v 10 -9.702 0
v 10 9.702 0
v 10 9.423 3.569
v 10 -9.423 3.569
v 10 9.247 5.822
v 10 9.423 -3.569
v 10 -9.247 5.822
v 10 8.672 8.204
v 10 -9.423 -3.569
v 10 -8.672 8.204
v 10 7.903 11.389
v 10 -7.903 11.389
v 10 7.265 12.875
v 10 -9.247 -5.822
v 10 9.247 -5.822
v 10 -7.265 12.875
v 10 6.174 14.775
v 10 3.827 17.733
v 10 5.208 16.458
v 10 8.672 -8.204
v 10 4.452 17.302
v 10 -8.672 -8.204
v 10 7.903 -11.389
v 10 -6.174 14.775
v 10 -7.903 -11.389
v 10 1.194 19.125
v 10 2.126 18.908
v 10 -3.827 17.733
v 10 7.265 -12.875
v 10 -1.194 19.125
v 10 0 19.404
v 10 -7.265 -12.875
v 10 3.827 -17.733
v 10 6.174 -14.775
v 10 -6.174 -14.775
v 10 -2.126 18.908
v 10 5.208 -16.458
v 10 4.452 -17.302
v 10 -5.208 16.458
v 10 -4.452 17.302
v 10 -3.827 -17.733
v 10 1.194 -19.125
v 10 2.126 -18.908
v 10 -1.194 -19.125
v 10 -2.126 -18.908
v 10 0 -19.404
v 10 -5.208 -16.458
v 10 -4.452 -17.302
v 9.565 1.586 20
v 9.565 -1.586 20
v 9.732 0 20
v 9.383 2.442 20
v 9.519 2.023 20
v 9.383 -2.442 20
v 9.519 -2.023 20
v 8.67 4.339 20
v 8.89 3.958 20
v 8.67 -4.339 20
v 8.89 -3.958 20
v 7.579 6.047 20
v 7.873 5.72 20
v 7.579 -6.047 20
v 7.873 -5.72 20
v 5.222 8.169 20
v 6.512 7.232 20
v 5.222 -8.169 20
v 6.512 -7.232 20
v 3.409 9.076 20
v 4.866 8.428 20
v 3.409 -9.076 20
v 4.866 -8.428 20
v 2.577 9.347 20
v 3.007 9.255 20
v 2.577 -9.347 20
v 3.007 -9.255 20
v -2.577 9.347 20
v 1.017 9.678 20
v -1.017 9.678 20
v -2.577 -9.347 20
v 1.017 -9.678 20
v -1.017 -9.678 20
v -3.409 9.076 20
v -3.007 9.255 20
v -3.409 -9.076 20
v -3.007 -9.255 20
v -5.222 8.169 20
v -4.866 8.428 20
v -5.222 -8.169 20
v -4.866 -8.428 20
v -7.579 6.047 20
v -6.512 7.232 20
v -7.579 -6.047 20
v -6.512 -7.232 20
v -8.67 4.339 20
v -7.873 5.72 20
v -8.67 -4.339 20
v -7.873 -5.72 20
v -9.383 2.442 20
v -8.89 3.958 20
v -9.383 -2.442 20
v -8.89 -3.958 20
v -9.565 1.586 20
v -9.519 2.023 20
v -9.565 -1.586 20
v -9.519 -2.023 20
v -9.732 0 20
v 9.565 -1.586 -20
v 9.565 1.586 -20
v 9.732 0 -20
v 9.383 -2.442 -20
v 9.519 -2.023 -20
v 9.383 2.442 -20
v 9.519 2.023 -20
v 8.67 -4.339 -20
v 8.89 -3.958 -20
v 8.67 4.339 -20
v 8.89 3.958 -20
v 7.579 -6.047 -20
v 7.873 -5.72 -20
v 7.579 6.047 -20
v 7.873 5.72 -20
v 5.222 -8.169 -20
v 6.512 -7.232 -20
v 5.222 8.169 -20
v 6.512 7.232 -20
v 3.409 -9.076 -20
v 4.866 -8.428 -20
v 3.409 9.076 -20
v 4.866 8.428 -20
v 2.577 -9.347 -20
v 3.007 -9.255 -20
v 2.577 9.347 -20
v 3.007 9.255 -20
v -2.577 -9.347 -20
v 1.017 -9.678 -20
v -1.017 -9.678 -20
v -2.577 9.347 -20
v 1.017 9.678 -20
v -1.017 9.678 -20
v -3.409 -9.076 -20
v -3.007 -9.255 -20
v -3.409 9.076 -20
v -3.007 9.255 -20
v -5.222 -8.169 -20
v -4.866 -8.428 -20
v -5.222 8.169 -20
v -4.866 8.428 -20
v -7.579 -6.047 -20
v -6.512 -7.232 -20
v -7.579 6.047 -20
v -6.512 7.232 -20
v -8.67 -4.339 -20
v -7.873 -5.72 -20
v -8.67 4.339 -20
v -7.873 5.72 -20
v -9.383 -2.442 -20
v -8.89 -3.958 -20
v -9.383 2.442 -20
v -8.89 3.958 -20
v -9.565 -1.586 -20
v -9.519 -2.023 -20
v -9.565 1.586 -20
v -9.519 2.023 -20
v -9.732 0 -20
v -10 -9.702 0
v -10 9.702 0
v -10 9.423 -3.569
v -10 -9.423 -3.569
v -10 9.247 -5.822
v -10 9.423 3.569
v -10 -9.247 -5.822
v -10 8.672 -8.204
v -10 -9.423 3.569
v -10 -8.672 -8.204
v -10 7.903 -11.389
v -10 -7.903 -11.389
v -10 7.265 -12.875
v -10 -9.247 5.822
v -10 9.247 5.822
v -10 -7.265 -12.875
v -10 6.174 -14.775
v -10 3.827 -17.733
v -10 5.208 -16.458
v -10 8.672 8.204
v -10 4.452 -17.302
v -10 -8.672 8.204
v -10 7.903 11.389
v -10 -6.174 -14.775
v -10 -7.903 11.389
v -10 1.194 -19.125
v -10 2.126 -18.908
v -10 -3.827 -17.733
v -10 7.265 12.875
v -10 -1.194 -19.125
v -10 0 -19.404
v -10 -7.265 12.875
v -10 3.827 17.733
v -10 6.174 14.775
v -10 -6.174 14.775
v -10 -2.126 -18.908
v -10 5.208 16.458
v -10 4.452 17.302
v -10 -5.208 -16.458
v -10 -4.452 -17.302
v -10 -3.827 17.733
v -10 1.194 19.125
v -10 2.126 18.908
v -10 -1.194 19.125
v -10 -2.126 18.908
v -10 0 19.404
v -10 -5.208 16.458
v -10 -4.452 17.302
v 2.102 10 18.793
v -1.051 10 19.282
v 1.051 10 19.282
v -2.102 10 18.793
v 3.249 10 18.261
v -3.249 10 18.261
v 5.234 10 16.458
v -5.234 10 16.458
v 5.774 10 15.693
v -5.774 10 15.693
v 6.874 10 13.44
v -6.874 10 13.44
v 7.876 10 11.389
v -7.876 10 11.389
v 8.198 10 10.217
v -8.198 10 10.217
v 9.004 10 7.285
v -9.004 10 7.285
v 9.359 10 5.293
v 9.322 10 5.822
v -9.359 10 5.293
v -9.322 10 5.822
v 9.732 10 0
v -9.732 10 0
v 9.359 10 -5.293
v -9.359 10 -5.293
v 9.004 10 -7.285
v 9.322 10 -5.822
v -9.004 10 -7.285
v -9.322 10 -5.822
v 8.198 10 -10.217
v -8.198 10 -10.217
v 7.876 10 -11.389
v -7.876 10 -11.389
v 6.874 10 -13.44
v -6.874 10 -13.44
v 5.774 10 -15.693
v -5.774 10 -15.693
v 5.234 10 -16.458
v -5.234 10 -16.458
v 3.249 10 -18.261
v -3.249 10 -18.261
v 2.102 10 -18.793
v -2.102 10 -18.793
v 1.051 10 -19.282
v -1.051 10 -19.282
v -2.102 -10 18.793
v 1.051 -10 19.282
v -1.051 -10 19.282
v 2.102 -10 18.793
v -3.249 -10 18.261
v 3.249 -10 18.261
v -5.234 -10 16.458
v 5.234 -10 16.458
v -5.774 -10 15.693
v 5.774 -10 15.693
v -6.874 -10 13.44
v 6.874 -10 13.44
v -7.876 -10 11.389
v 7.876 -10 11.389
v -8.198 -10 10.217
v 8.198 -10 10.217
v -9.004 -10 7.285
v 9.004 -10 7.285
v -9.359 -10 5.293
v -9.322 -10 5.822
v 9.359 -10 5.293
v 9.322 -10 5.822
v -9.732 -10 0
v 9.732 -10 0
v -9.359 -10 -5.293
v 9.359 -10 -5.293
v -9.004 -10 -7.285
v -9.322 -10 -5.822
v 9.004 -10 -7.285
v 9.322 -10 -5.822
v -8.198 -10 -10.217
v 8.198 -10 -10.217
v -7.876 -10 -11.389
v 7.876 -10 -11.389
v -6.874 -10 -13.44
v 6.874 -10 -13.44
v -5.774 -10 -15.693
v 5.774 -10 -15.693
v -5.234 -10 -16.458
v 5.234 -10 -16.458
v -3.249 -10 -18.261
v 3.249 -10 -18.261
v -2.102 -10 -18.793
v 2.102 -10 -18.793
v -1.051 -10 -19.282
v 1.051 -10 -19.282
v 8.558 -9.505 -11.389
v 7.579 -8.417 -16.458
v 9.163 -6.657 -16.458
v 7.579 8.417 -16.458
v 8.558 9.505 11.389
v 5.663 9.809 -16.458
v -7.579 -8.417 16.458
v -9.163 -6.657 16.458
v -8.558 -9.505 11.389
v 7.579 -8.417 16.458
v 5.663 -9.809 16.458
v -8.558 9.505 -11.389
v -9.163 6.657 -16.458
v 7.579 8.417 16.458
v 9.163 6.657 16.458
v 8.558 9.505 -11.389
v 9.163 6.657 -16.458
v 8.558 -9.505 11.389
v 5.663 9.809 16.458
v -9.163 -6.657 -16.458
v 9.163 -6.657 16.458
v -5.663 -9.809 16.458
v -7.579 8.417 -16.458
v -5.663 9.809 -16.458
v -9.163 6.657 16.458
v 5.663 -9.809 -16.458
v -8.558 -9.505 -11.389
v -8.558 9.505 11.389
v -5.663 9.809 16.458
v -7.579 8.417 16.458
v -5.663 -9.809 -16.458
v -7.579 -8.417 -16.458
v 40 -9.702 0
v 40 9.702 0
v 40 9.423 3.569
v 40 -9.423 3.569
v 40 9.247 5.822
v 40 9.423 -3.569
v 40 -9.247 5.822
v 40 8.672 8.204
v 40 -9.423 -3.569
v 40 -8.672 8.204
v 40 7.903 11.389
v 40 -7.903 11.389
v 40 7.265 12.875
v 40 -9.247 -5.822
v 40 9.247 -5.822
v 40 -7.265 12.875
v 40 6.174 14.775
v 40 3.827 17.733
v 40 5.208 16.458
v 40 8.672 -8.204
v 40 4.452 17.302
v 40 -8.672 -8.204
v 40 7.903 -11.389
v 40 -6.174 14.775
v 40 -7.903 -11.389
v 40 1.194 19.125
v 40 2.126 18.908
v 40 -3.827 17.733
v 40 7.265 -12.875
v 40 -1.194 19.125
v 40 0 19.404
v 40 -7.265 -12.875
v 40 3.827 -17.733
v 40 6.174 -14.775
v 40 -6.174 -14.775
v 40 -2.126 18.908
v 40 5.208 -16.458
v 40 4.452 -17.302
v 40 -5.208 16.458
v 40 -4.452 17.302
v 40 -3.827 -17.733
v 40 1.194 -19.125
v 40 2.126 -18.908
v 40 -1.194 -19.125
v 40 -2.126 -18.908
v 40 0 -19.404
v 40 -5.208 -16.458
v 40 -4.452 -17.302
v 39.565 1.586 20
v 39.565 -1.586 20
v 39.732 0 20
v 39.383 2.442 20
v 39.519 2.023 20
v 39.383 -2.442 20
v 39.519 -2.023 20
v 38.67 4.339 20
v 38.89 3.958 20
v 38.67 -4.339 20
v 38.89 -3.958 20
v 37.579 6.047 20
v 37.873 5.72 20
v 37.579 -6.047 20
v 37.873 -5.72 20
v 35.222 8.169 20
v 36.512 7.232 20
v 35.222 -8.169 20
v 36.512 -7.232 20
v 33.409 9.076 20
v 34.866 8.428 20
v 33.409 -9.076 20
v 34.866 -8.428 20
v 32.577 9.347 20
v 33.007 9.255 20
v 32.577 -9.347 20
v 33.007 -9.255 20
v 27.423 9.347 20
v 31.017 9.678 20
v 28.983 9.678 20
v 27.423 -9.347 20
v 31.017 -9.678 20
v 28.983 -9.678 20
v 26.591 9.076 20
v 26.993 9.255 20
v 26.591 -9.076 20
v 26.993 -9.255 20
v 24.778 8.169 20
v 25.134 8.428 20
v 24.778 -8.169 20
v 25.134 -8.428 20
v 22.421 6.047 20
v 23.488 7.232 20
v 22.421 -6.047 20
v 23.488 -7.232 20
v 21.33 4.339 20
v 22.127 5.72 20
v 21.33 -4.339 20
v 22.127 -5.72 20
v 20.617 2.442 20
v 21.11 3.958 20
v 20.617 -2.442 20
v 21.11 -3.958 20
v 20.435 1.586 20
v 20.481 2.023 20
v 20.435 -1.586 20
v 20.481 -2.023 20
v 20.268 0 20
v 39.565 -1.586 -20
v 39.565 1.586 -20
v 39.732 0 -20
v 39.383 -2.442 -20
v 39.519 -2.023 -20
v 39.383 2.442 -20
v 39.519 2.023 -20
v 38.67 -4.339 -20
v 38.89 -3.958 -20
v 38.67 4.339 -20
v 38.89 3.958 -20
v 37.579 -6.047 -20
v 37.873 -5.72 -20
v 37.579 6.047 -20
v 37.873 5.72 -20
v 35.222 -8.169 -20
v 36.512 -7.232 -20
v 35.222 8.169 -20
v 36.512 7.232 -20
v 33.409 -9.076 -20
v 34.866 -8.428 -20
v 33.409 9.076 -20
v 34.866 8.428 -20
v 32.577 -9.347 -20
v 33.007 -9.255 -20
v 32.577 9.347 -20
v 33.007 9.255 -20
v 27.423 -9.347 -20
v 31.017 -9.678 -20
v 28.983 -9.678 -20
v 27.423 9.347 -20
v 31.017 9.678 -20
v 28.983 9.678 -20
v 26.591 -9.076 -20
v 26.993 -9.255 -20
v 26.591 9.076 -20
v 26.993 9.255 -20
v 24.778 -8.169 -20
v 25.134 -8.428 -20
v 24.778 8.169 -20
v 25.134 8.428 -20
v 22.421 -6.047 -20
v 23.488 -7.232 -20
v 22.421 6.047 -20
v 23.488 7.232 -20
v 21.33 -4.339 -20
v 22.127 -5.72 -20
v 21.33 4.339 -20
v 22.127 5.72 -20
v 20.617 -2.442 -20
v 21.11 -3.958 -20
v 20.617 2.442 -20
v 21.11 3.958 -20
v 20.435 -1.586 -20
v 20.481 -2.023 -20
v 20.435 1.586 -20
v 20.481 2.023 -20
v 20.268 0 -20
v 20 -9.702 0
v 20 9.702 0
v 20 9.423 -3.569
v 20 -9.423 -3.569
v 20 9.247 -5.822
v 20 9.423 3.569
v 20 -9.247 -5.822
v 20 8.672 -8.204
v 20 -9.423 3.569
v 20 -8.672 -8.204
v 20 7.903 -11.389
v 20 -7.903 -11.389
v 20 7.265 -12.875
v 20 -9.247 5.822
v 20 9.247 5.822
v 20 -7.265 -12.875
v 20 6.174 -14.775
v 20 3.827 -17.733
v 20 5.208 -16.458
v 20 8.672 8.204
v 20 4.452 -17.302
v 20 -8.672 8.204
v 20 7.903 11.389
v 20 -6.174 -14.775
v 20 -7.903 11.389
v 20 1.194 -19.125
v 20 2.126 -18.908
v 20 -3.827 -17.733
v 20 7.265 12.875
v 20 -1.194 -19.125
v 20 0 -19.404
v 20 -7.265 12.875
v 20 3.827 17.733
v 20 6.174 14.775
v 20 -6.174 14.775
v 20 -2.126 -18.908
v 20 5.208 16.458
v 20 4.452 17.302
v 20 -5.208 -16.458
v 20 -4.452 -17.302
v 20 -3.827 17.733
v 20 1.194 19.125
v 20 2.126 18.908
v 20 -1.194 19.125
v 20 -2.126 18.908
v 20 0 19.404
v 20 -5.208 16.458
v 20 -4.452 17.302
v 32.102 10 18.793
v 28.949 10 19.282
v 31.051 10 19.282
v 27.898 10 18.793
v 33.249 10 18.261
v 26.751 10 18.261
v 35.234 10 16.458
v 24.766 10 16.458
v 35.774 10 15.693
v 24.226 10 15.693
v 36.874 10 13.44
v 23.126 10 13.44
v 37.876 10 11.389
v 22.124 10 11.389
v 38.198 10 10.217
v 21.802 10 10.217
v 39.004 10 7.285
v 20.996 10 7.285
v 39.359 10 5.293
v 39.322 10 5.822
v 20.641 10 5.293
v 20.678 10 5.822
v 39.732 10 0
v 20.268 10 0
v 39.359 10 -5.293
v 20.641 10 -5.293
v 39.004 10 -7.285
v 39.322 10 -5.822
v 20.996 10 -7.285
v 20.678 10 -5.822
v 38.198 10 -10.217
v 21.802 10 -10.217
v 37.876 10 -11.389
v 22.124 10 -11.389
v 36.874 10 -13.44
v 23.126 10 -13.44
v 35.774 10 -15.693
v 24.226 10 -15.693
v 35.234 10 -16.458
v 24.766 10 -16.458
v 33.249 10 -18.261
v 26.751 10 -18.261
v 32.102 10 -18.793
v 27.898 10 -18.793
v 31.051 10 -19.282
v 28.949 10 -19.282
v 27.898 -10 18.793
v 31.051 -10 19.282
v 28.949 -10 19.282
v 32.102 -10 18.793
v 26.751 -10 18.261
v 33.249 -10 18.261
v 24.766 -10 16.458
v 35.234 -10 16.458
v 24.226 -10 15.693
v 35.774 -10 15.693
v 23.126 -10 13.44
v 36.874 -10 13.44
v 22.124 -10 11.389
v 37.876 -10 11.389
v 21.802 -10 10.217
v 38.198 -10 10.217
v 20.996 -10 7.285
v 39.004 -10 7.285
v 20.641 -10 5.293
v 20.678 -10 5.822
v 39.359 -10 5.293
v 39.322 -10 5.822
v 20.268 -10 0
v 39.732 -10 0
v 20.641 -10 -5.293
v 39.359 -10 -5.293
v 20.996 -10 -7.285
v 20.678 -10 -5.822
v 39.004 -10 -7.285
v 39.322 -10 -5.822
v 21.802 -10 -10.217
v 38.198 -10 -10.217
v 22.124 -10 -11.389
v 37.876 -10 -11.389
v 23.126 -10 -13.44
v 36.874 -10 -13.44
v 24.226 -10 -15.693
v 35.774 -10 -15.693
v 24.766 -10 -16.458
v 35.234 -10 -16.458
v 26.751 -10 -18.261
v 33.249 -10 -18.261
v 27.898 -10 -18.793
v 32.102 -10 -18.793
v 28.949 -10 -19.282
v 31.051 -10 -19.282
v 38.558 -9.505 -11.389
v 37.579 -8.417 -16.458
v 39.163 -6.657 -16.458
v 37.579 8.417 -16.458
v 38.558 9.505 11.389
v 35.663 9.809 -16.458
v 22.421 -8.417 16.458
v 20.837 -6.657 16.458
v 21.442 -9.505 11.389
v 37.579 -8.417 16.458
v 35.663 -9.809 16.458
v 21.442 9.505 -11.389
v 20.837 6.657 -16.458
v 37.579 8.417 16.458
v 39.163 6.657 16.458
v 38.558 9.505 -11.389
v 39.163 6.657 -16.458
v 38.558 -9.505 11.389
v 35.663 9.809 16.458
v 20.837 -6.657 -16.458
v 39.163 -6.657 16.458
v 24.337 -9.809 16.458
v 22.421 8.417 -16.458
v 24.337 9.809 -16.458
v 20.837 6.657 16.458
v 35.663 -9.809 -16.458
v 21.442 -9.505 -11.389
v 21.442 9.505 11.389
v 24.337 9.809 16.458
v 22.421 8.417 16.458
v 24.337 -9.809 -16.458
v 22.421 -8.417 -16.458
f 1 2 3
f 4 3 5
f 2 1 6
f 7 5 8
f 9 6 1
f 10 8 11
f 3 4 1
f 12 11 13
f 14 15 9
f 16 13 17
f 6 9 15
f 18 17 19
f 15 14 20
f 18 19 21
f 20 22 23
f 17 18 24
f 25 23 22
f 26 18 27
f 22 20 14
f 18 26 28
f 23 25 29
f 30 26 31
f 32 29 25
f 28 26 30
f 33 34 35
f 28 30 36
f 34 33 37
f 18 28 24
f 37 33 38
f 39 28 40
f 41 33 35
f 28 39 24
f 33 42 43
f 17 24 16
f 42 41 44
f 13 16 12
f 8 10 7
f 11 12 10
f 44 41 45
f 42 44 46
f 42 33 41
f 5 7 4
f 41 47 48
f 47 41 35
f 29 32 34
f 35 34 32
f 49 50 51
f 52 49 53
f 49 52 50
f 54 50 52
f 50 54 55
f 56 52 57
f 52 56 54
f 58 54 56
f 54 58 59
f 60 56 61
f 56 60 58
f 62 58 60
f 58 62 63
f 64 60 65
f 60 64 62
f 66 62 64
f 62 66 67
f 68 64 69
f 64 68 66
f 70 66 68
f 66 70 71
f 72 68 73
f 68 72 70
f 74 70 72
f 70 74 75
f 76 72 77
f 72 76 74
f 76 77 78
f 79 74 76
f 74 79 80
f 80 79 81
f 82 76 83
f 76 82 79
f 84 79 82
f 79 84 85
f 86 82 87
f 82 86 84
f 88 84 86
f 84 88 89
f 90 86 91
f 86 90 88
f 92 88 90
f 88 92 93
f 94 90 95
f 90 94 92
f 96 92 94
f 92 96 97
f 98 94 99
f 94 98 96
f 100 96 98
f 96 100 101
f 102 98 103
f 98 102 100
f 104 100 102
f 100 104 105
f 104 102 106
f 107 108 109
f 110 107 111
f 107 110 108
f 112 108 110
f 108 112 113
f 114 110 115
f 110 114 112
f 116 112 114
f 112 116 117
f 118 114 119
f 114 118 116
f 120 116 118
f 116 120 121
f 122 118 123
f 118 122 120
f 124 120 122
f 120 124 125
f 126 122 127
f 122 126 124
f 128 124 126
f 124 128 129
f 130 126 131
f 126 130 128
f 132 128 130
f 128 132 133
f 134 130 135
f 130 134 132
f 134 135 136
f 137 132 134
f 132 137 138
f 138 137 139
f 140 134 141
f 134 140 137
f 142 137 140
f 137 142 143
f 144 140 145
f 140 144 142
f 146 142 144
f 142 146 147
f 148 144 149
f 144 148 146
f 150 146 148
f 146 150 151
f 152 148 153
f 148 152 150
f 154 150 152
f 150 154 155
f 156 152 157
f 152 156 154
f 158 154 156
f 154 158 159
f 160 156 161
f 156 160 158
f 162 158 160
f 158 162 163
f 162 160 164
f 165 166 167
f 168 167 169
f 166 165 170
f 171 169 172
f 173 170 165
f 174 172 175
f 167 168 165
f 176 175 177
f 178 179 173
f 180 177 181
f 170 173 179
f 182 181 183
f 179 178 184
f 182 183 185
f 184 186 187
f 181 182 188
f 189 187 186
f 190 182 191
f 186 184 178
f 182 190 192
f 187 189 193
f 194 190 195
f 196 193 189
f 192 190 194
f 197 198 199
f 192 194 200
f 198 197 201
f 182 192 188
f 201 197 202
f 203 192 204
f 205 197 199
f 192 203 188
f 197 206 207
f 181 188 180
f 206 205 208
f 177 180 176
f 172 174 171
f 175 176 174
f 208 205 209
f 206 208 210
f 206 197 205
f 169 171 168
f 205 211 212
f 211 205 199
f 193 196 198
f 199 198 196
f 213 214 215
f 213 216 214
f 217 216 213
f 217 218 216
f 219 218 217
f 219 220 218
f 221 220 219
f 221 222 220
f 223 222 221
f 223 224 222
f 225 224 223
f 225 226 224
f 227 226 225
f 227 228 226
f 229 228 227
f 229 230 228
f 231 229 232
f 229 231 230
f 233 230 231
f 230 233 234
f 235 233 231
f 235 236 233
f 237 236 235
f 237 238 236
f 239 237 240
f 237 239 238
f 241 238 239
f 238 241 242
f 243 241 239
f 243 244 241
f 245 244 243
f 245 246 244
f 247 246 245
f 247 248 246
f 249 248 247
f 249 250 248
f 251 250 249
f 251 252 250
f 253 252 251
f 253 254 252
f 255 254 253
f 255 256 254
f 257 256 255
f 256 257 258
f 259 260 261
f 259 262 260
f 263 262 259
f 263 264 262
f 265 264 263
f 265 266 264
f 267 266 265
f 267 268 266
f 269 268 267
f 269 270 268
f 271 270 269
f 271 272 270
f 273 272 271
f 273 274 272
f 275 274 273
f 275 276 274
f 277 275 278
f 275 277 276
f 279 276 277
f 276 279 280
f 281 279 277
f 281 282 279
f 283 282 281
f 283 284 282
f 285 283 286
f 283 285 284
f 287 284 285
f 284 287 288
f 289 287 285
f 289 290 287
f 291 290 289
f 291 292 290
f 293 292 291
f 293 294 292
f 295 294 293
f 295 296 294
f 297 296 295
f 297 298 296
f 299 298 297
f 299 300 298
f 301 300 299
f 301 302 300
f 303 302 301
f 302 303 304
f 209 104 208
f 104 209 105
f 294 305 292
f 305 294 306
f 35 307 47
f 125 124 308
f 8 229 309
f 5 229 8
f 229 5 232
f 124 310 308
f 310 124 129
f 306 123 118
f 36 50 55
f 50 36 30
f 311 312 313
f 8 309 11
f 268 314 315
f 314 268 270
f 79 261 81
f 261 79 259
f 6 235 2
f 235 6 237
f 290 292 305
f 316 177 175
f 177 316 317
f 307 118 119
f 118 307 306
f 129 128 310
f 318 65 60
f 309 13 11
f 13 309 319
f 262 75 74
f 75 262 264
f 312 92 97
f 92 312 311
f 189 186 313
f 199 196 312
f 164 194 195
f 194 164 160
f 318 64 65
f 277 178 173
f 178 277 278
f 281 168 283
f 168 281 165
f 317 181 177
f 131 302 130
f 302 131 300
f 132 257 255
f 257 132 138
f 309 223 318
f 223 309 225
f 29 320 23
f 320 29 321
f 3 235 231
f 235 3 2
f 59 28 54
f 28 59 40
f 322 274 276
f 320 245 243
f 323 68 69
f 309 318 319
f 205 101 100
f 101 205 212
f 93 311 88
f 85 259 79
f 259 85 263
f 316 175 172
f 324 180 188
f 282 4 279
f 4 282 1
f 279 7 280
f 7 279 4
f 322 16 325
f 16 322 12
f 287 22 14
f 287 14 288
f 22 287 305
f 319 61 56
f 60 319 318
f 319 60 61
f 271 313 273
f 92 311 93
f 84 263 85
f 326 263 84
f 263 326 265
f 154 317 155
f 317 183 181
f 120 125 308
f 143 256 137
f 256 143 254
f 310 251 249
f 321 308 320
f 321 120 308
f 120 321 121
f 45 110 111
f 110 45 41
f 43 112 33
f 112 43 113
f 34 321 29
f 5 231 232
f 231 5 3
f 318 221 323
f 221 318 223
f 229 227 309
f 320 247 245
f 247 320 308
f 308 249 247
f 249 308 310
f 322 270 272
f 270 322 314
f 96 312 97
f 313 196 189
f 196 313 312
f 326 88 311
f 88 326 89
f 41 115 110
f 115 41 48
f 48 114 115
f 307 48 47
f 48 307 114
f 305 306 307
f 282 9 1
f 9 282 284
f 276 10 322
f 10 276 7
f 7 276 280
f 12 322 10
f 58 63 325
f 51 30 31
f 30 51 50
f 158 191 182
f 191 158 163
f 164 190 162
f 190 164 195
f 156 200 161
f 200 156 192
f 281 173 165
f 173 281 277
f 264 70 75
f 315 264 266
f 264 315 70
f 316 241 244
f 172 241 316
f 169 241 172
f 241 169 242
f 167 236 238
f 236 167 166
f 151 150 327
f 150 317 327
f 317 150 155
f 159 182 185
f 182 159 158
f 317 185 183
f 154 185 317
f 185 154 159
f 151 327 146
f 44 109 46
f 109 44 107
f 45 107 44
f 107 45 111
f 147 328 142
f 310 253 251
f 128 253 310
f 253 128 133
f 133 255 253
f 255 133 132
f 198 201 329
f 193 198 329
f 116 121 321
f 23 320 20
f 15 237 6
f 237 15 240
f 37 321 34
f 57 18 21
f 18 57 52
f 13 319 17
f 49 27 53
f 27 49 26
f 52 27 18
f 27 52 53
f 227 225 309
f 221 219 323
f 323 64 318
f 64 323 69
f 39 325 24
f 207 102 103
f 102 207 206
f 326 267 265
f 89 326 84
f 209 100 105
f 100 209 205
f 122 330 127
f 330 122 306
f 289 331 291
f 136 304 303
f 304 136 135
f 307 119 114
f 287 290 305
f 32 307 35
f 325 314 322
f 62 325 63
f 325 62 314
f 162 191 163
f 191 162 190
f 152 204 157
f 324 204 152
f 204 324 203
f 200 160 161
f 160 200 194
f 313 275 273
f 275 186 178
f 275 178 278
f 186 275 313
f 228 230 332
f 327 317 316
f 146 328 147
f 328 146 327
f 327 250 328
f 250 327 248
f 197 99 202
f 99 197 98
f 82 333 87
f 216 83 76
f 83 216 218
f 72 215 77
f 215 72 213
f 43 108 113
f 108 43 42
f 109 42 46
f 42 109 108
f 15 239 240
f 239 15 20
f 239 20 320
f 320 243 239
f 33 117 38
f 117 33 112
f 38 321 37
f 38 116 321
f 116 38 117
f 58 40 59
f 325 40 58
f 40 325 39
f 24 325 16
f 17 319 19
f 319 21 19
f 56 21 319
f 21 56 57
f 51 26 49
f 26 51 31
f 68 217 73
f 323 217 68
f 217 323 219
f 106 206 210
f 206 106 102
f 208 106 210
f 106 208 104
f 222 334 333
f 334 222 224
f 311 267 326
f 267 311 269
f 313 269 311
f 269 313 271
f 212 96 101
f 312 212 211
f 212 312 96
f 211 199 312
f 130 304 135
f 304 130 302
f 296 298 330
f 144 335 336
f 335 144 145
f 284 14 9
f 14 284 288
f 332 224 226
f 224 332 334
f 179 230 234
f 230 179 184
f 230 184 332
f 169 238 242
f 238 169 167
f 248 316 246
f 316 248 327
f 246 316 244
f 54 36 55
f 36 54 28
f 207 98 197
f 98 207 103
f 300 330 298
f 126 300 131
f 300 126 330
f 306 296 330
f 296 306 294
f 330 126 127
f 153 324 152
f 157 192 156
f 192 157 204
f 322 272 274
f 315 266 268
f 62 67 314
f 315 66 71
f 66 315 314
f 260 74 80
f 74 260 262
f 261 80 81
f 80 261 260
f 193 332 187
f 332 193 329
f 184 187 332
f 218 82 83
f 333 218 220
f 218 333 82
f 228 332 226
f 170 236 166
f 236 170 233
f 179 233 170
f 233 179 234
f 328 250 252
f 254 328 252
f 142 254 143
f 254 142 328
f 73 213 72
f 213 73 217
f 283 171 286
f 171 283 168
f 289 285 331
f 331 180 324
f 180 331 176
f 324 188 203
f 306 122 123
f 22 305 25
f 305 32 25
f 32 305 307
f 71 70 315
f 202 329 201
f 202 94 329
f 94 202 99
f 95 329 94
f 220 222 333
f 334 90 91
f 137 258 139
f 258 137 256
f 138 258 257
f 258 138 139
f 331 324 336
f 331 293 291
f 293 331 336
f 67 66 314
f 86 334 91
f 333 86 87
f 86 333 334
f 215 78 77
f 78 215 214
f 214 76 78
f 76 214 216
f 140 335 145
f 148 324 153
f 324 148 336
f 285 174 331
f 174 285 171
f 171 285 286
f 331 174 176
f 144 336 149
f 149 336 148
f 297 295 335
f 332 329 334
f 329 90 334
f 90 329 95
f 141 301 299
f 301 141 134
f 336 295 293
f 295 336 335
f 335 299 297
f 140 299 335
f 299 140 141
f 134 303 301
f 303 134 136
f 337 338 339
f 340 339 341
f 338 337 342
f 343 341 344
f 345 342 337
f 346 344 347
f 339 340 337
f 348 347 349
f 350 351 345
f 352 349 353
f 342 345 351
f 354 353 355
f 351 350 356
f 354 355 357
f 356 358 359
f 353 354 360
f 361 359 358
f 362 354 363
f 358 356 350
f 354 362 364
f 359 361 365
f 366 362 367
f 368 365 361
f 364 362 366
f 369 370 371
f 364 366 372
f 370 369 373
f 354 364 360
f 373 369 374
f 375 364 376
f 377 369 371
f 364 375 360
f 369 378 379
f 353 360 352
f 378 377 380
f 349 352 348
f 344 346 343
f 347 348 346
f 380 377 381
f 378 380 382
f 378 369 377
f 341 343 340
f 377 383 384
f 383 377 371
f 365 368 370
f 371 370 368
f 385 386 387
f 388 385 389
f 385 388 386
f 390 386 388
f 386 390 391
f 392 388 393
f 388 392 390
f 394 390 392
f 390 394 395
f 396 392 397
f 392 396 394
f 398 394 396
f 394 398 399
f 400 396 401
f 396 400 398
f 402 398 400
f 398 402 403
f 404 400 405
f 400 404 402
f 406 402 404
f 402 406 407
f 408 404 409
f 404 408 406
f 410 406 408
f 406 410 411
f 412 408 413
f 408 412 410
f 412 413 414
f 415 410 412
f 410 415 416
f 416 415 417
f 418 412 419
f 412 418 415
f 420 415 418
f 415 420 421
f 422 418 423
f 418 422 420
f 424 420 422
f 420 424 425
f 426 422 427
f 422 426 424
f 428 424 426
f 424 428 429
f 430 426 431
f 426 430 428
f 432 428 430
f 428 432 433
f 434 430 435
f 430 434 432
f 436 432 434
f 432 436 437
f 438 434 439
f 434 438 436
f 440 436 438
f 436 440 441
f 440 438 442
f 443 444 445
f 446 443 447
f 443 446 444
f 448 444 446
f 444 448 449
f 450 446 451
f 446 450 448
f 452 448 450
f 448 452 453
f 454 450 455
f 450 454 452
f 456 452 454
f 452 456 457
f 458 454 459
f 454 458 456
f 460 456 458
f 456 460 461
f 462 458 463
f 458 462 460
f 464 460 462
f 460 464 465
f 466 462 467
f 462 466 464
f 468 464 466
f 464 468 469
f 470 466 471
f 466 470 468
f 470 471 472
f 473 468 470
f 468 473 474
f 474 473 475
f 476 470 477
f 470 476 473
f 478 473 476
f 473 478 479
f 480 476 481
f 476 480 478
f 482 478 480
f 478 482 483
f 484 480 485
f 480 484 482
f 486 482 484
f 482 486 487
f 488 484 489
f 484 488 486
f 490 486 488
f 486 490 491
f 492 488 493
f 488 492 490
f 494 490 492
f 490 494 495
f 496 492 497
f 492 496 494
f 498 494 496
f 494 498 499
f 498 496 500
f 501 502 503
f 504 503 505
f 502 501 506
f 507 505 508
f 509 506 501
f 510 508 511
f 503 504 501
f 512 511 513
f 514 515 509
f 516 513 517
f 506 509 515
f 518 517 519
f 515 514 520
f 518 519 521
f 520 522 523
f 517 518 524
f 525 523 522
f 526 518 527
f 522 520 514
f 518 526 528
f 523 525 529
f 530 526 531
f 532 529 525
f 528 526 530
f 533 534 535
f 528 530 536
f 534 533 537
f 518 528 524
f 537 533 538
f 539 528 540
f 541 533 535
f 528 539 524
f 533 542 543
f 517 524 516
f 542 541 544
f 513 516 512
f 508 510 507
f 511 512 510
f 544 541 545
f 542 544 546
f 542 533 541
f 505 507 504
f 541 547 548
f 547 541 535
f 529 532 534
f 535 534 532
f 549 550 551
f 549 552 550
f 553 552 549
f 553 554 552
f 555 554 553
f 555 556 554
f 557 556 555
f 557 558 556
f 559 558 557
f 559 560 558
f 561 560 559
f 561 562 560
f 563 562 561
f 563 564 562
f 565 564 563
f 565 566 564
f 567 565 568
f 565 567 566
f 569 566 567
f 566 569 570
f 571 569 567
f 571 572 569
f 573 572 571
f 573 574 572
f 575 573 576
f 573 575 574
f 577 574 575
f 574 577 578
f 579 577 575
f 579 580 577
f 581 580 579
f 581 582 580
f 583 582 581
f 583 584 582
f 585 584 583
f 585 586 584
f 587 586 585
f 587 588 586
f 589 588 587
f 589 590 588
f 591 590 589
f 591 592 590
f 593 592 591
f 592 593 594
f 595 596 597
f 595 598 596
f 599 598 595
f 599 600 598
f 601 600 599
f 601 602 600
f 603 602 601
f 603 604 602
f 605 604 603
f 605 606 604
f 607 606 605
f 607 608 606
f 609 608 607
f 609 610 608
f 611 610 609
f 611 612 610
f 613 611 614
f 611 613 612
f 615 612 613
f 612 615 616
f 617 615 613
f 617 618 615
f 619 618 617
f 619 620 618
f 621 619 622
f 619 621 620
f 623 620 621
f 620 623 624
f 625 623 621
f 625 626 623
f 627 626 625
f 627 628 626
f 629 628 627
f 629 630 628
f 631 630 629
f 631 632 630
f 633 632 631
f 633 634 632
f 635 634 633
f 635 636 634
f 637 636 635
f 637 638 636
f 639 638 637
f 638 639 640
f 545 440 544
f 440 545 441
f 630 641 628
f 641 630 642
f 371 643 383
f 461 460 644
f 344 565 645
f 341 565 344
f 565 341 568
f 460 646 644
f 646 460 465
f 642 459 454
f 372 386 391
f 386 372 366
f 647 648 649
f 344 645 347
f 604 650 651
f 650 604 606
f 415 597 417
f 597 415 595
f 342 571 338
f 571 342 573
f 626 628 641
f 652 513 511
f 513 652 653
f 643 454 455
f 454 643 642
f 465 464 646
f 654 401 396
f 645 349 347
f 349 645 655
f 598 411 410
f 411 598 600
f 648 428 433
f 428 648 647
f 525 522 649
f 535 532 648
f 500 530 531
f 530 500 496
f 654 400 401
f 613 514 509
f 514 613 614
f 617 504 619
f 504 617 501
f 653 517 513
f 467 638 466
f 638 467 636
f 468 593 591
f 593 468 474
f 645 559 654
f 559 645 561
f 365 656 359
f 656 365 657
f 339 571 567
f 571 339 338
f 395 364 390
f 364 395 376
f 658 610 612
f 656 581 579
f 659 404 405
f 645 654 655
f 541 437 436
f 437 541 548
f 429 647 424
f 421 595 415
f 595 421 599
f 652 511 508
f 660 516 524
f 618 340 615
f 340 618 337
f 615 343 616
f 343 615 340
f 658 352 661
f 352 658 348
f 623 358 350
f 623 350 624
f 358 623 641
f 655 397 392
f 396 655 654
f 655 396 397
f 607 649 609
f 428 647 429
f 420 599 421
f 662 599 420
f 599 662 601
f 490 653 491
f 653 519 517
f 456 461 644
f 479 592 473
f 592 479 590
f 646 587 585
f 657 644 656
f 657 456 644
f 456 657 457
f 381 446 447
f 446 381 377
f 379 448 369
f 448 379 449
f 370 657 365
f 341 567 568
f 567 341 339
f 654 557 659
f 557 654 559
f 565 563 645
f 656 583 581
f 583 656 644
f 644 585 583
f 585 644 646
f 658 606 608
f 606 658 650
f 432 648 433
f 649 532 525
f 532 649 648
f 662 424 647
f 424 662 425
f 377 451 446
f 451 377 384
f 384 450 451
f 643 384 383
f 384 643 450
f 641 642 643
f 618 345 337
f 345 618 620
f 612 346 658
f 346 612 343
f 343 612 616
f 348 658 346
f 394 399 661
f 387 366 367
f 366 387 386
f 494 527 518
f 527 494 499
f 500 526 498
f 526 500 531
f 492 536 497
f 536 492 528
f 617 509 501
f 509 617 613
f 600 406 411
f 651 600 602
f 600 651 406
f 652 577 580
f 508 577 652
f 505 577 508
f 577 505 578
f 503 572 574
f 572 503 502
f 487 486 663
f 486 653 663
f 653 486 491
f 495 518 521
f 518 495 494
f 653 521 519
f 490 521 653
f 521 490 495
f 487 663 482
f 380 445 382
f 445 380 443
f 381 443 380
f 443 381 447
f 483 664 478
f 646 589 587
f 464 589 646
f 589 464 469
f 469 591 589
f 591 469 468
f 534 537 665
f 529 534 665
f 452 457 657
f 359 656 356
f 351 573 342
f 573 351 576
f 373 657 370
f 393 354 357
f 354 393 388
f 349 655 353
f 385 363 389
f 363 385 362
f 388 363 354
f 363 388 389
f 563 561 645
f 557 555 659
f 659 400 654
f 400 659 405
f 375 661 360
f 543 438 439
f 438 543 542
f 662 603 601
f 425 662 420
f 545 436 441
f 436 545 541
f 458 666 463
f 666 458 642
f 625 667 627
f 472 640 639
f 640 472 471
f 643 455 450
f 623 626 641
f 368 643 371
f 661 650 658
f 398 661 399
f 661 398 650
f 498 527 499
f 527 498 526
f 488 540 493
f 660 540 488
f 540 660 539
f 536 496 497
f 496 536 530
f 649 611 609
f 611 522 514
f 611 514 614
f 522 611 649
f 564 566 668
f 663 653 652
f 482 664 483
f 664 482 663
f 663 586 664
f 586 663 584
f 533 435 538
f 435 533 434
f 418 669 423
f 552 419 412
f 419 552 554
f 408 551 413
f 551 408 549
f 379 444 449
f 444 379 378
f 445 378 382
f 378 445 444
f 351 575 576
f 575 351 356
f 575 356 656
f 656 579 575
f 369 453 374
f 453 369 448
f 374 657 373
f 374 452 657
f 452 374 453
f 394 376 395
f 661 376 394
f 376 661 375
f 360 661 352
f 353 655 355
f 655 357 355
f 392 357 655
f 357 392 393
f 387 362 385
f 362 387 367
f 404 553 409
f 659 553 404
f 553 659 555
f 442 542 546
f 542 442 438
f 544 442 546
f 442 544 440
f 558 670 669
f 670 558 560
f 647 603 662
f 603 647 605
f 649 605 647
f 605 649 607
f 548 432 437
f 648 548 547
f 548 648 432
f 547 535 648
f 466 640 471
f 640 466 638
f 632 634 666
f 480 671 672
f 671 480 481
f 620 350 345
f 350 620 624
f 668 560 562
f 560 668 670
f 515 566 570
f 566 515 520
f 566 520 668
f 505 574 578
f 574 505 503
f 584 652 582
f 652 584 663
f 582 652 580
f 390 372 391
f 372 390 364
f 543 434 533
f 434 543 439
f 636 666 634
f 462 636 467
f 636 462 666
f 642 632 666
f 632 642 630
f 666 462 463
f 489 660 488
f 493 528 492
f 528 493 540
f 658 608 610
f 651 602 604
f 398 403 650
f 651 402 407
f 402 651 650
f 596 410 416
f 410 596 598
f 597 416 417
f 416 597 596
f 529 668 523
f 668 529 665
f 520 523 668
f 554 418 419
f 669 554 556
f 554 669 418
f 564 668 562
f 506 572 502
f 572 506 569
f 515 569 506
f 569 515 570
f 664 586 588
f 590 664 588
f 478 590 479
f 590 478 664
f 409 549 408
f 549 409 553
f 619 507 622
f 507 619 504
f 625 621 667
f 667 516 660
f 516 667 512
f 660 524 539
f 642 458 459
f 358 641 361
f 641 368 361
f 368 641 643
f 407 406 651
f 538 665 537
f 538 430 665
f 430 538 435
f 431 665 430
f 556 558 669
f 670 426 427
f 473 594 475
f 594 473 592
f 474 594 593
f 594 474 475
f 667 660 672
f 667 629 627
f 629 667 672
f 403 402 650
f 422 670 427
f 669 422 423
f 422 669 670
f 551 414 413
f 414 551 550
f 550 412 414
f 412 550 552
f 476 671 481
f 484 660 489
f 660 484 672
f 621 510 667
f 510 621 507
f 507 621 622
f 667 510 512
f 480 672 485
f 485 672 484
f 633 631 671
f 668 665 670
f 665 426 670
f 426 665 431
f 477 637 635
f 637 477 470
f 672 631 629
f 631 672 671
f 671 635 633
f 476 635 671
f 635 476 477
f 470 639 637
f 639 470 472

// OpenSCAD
/*
translate([5,20,20]){
        color("blue"){
            rotate([0,90,0]){
                cylinder(10,12,8); 
            }
        }
    }
*/


module block1(){
scale([1,1,2]){
        intersection(){
            cube([20,20,20], center=true);
            color("green"){
                sphere(14); 
            }
          
        }
    }
}


block1();

translate([30,0,0]){
    block1();
    }
